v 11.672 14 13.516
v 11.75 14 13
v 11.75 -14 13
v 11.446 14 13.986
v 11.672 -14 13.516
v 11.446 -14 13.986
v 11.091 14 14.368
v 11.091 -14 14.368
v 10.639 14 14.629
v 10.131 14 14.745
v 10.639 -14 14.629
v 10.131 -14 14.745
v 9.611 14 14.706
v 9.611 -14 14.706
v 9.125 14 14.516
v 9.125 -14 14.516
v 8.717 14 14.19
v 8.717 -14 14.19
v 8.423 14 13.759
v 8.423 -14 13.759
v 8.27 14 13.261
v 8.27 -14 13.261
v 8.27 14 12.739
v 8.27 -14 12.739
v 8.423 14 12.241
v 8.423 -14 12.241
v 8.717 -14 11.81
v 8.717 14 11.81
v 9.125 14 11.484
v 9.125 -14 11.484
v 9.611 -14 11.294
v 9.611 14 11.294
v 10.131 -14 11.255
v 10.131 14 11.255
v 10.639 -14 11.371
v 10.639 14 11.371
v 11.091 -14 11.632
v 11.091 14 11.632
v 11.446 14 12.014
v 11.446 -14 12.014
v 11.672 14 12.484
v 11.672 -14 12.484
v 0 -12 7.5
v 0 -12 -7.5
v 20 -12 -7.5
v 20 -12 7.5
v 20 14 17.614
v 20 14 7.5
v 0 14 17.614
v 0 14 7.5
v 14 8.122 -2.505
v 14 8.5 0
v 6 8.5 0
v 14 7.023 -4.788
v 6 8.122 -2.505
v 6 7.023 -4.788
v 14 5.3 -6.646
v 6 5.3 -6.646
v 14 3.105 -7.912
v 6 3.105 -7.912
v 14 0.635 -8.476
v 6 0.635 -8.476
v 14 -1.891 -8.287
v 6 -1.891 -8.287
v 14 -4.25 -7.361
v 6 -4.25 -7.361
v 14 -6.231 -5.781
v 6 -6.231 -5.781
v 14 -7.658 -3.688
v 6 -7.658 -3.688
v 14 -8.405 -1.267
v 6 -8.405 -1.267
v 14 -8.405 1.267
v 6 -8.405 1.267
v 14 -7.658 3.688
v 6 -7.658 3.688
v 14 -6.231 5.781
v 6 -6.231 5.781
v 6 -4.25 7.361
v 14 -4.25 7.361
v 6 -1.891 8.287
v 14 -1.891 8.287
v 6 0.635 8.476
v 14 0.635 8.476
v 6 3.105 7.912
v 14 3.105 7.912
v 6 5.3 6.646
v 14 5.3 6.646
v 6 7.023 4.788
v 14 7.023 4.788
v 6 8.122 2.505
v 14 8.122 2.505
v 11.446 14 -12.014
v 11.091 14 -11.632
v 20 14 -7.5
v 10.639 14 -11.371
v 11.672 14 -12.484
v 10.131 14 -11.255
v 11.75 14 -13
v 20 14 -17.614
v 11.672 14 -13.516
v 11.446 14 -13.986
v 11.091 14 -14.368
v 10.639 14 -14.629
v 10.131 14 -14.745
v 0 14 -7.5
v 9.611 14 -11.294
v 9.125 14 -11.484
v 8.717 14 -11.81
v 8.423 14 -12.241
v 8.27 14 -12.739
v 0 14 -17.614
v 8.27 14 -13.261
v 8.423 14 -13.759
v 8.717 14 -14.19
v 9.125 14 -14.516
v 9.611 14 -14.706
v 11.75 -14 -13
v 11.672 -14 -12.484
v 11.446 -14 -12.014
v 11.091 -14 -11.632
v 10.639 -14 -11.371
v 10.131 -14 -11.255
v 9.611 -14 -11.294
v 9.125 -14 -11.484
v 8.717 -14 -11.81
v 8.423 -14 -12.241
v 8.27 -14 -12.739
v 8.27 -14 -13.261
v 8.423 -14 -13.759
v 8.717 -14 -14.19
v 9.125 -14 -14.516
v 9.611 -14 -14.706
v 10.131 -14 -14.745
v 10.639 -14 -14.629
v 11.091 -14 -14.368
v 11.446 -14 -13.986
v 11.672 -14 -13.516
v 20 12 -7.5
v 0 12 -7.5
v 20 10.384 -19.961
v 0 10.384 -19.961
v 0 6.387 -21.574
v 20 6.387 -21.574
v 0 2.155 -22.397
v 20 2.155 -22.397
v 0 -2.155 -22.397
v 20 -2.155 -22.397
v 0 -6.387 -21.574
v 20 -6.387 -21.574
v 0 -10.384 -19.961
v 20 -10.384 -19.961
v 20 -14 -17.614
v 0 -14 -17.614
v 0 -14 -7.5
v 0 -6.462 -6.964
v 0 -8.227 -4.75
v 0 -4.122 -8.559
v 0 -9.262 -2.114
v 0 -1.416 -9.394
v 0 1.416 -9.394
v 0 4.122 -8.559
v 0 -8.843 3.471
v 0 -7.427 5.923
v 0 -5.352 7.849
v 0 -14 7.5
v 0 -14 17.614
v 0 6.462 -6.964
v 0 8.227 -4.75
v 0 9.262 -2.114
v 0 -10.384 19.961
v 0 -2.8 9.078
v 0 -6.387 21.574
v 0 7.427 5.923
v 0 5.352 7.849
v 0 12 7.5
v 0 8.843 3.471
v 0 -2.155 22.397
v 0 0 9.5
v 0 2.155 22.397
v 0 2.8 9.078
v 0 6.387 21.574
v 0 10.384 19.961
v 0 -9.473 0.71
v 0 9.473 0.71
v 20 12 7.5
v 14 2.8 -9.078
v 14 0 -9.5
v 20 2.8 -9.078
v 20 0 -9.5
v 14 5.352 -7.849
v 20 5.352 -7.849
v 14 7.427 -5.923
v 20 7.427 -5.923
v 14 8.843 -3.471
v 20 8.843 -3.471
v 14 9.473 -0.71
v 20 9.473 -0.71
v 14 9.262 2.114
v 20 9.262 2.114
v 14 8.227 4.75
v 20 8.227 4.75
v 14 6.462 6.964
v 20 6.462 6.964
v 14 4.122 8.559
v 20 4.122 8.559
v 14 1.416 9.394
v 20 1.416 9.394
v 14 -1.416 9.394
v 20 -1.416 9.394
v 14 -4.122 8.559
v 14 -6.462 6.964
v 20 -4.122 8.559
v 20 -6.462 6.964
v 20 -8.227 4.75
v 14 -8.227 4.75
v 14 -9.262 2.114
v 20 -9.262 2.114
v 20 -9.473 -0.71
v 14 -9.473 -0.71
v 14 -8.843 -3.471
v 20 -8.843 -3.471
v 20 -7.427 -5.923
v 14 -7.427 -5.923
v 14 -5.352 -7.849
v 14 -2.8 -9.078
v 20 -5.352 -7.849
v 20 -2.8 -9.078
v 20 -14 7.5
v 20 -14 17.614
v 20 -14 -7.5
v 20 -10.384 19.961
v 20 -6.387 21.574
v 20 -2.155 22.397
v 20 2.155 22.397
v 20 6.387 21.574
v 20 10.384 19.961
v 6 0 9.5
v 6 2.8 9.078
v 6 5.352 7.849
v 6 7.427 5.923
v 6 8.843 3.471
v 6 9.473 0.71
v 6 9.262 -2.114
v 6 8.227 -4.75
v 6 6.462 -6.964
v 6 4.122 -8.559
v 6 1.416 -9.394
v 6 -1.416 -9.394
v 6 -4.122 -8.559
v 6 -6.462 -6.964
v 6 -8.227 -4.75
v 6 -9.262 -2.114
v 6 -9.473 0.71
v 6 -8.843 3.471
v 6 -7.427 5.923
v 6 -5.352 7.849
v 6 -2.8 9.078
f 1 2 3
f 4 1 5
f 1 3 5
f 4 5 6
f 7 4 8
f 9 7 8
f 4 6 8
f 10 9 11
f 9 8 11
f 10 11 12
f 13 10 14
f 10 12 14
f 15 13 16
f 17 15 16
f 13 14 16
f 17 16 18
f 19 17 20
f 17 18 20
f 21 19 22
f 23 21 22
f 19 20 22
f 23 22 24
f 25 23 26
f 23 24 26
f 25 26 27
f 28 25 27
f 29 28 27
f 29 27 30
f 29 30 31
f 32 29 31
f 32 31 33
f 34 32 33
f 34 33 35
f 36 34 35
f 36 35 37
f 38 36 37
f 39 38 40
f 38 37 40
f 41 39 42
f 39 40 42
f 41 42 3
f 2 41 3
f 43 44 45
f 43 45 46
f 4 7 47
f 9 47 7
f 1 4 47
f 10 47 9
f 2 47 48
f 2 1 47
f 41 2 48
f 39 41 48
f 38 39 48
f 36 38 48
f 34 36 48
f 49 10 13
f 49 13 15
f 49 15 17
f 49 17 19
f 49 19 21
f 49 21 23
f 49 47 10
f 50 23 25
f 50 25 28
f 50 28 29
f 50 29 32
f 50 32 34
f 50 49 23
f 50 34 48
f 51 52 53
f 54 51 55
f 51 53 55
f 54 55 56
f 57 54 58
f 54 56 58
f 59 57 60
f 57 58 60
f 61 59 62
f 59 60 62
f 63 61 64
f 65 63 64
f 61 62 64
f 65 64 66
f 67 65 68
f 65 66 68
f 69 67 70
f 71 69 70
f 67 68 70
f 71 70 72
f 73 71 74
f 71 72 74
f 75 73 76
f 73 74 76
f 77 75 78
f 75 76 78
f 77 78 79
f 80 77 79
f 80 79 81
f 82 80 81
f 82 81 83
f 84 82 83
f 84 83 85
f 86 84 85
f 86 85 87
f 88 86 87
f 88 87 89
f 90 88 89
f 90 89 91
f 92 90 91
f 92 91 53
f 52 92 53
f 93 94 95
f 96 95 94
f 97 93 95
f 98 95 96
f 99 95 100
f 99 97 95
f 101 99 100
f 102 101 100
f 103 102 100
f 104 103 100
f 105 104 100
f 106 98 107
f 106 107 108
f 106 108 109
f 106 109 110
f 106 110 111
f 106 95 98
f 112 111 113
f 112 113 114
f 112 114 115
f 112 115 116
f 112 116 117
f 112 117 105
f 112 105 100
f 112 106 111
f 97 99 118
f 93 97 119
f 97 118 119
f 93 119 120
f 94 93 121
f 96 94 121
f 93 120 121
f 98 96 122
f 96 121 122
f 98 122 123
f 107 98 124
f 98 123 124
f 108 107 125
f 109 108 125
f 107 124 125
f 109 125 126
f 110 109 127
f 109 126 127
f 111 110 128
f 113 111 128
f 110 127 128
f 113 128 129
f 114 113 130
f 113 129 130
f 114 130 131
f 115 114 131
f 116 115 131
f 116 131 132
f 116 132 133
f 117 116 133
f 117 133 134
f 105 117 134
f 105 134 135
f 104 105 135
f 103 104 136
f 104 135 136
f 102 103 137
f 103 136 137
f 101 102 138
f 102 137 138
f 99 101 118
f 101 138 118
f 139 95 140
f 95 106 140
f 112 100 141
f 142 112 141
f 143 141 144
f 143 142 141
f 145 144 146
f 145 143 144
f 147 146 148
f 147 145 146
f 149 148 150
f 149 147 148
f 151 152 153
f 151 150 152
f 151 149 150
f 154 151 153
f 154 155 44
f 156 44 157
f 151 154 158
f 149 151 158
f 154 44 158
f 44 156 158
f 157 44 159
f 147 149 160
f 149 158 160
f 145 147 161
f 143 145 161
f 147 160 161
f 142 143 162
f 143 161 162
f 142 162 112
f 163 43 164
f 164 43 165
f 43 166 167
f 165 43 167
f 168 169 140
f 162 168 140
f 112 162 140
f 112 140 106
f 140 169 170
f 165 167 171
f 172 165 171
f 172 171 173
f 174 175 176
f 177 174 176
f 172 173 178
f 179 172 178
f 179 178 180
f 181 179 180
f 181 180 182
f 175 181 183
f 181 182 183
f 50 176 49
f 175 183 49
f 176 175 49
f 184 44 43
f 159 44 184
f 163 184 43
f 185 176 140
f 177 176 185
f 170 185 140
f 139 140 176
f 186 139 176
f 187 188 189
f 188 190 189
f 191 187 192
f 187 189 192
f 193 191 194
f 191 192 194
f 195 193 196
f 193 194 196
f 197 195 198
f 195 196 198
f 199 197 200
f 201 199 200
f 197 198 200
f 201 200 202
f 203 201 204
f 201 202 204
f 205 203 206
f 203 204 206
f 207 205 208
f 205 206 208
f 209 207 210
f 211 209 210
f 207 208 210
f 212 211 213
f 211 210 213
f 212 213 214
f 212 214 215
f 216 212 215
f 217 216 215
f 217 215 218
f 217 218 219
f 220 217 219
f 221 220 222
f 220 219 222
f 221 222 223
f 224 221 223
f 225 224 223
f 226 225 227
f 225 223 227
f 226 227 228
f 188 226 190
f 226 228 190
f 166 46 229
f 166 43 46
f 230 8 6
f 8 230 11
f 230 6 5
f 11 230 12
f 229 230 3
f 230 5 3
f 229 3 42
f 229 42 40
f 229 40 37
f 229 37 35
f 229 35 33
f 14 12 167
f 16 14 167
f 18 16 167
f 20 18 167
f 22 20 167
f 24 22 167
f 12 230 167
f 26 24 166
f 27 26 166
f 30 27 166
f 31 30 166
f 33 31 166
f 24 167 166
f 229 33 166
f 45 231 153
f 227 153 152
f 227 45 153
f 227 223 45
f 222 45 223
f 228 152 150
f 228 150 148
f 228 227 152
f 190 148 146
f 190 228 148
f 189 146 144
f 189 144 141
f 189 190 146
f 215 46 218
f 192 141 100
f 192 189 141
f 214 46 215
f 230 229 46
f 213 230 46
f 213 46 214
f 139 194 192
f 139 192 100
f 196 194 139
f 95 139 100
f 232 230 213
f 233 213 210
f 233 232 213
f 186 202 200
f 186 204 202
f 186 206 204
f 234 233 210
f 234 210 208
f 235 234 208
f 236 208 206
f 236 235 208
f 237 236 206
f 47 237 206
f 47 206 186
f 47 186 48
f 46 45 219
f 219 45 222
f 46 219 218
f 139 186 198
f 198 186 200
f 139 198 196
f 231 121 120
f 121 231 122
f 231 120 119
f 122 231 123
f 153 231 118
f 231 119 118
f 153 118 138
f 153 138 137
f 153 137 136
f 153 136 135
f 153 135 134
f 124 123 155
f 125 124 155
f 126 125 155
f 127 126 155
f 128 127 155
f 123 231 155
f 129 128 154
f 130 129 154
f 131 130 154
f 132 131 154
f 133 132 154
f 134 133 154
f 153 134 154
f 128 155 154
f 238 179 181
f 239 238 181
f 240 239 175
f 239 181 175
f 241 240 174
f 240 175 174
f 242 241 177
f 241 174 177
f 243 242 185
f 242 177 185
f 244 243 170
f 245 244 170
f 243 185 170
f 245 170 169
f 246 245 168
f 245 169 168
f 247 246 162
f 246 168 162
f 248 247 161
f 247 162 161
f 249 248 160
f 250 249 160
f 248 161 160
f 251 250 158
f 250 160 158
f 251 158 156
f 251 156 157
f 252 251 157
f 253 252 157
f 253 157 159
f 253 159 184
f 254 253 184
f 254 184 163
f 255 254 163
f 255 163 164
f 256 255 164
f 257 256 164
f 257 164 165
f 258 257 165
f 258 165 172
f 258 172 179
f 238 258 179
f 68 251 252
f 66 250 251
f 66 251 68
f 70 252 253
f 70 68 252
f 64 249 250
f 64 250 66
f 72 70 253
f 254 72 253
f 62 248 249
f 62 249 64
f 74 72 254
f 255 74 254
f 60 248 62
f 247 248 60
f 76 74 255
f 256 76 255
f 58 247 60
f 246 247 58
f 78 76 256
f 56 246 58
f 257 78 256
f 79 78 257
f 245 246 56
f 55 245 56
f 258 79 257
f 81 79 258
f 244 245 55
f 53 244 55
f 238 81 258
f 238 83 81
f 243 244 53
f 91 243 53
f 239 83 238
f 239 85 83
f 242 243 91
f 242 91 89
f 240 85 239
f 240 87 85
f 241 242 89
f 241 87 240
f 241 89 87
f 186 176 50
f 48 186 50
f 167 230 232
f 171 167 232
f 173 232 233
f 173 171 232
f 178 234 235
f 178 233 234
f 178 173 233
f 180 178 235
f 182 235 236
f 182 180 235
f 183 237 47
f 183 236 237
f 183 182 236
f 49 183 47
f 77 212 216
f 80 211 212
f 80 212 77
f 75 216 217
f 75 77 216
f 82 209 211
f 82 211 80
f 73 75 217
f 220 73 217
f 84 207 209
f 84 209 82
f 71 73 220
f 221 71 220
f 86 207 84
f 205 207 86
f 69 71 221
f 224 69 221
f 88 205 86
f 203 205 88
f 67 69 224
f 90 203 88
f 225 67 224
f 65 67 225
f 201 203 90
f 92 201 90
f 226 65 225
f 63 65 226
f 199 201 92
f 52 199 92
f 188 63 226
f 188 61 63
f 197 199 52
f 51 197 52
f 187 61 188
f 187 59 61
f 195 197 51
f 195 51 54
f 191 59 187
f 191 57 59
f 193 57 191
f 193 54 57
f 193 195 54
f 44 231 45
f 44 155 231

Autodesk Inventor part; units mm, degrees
ref_plane "YZ Plane" through (0, 0, 0) normal (1, 0, 0) x (0, 1, 0)
ref_plane "XZ Plane" through (0, 0, 0) normal (0, 1, 0) x (-1, 0, 0)
ref_plane "XY Plane" through (0, 0, 0) normal (0, 0, 1) x (1, 0, 0)
sketch "Эскиз1" plane through (0, 0, 0) normal (1, 0, 0) x (0, 1, 0)
  circle A0 centre (0, 0) radius 8.5
  circle A1 centre (0, 0) radius 22.5
  dimension "d0" = 17
  dimension "d1" = 45
extrude "Выдавливание1" add sketch "Эскиз1" along normal blind 20
sketch "Эскиз2" plane through (20, 0, 0) normal (1, 0, 0) x (0, 0, -1)
  circle A0 centre (0, 0) radius 9.5
  dimension "d4" = 19
extrude "Выдавливание2" cut sketch "Эскиз2" against normal blind 6
sketch "Эскиз3" plane through (0, 0, 0) normal (-1, 0, 0) x (0, 0, 1)
  circle A0 centre (0, 0) radius 9.5
  dimension "d7" = 19
extrude "Выдавливание3" cut sketch "Эскиз3" against normal blind 6
sketch "Эскиз4" plane through (0, 0, 0) normal (-1, 0, 0) x (0, 0, 1)
  line L0 (0, 0) -> (-20.5063, 0) construction
  line L1 (-25, -34) -> (25, -34)
  line L2 (25, -34) -> (25, -14)
  line L3 (25, -14) -> (-25, -14)
  line L4 (-25, -14) -> (-25, -34)
  line L5 (0, 0) -> (0, -5.1582) construction
  line L6 (-25, 34) -> (25, 34)
  line L7 (25, 34) -> (25, 14)
  line L8 (25, 14) -> (-25, 14)
  line L9 (-25, 14) -> (-25, 34)
  line L10 (7.5, -14) -> (-7.5, -14)
  line L11 (-7.5, -14) -> (-7.5, -12)
  line L12 (-7.5, -12) -> (7.5, -12)
  line L13 (7.5, -12) -> (7.5, -14)
  line L14 (7.5, 14) -> (-7.5, 14)
  line L15 (-7.5, 14) -> (-7.5, 12)
  line L16 (-7.5, 12) -> (7.5, 12)
  line L17 (7.5, 12) -> (7.5, 14)
  dimension "d10" = 20
  dimension "d11" = 50
  dimension "d12" = 14
  dimension "d18" = 2
  dimension "d19" = 15
extrude "Выдавливание4" cut sketch "Эскиз4" against normal blind 50
sketch "Эскиз5" plane through (0, -14, -17.6139) normal (0, -1, 0) x (1, 0, 0)
  line L0 (0, 25.1139) -> (20, 25.1139) projected
  line L1 (10, 25.1139) -> (10, 12.2228) construction
  circle A0 centre (10, 30.6139) radius 1.75
  line L2 (0, 17.6139) -> (23.1932, 17.6139) construction
  circle A1 centre (10, 4.6139) radius 1.75
  dimension "d20" = 3.5
  dimension "d21" = 13
extrude "Выдавливание5" cut sketch "Эскиз5" against normal through all
properties part number "04-04-Кулак"
